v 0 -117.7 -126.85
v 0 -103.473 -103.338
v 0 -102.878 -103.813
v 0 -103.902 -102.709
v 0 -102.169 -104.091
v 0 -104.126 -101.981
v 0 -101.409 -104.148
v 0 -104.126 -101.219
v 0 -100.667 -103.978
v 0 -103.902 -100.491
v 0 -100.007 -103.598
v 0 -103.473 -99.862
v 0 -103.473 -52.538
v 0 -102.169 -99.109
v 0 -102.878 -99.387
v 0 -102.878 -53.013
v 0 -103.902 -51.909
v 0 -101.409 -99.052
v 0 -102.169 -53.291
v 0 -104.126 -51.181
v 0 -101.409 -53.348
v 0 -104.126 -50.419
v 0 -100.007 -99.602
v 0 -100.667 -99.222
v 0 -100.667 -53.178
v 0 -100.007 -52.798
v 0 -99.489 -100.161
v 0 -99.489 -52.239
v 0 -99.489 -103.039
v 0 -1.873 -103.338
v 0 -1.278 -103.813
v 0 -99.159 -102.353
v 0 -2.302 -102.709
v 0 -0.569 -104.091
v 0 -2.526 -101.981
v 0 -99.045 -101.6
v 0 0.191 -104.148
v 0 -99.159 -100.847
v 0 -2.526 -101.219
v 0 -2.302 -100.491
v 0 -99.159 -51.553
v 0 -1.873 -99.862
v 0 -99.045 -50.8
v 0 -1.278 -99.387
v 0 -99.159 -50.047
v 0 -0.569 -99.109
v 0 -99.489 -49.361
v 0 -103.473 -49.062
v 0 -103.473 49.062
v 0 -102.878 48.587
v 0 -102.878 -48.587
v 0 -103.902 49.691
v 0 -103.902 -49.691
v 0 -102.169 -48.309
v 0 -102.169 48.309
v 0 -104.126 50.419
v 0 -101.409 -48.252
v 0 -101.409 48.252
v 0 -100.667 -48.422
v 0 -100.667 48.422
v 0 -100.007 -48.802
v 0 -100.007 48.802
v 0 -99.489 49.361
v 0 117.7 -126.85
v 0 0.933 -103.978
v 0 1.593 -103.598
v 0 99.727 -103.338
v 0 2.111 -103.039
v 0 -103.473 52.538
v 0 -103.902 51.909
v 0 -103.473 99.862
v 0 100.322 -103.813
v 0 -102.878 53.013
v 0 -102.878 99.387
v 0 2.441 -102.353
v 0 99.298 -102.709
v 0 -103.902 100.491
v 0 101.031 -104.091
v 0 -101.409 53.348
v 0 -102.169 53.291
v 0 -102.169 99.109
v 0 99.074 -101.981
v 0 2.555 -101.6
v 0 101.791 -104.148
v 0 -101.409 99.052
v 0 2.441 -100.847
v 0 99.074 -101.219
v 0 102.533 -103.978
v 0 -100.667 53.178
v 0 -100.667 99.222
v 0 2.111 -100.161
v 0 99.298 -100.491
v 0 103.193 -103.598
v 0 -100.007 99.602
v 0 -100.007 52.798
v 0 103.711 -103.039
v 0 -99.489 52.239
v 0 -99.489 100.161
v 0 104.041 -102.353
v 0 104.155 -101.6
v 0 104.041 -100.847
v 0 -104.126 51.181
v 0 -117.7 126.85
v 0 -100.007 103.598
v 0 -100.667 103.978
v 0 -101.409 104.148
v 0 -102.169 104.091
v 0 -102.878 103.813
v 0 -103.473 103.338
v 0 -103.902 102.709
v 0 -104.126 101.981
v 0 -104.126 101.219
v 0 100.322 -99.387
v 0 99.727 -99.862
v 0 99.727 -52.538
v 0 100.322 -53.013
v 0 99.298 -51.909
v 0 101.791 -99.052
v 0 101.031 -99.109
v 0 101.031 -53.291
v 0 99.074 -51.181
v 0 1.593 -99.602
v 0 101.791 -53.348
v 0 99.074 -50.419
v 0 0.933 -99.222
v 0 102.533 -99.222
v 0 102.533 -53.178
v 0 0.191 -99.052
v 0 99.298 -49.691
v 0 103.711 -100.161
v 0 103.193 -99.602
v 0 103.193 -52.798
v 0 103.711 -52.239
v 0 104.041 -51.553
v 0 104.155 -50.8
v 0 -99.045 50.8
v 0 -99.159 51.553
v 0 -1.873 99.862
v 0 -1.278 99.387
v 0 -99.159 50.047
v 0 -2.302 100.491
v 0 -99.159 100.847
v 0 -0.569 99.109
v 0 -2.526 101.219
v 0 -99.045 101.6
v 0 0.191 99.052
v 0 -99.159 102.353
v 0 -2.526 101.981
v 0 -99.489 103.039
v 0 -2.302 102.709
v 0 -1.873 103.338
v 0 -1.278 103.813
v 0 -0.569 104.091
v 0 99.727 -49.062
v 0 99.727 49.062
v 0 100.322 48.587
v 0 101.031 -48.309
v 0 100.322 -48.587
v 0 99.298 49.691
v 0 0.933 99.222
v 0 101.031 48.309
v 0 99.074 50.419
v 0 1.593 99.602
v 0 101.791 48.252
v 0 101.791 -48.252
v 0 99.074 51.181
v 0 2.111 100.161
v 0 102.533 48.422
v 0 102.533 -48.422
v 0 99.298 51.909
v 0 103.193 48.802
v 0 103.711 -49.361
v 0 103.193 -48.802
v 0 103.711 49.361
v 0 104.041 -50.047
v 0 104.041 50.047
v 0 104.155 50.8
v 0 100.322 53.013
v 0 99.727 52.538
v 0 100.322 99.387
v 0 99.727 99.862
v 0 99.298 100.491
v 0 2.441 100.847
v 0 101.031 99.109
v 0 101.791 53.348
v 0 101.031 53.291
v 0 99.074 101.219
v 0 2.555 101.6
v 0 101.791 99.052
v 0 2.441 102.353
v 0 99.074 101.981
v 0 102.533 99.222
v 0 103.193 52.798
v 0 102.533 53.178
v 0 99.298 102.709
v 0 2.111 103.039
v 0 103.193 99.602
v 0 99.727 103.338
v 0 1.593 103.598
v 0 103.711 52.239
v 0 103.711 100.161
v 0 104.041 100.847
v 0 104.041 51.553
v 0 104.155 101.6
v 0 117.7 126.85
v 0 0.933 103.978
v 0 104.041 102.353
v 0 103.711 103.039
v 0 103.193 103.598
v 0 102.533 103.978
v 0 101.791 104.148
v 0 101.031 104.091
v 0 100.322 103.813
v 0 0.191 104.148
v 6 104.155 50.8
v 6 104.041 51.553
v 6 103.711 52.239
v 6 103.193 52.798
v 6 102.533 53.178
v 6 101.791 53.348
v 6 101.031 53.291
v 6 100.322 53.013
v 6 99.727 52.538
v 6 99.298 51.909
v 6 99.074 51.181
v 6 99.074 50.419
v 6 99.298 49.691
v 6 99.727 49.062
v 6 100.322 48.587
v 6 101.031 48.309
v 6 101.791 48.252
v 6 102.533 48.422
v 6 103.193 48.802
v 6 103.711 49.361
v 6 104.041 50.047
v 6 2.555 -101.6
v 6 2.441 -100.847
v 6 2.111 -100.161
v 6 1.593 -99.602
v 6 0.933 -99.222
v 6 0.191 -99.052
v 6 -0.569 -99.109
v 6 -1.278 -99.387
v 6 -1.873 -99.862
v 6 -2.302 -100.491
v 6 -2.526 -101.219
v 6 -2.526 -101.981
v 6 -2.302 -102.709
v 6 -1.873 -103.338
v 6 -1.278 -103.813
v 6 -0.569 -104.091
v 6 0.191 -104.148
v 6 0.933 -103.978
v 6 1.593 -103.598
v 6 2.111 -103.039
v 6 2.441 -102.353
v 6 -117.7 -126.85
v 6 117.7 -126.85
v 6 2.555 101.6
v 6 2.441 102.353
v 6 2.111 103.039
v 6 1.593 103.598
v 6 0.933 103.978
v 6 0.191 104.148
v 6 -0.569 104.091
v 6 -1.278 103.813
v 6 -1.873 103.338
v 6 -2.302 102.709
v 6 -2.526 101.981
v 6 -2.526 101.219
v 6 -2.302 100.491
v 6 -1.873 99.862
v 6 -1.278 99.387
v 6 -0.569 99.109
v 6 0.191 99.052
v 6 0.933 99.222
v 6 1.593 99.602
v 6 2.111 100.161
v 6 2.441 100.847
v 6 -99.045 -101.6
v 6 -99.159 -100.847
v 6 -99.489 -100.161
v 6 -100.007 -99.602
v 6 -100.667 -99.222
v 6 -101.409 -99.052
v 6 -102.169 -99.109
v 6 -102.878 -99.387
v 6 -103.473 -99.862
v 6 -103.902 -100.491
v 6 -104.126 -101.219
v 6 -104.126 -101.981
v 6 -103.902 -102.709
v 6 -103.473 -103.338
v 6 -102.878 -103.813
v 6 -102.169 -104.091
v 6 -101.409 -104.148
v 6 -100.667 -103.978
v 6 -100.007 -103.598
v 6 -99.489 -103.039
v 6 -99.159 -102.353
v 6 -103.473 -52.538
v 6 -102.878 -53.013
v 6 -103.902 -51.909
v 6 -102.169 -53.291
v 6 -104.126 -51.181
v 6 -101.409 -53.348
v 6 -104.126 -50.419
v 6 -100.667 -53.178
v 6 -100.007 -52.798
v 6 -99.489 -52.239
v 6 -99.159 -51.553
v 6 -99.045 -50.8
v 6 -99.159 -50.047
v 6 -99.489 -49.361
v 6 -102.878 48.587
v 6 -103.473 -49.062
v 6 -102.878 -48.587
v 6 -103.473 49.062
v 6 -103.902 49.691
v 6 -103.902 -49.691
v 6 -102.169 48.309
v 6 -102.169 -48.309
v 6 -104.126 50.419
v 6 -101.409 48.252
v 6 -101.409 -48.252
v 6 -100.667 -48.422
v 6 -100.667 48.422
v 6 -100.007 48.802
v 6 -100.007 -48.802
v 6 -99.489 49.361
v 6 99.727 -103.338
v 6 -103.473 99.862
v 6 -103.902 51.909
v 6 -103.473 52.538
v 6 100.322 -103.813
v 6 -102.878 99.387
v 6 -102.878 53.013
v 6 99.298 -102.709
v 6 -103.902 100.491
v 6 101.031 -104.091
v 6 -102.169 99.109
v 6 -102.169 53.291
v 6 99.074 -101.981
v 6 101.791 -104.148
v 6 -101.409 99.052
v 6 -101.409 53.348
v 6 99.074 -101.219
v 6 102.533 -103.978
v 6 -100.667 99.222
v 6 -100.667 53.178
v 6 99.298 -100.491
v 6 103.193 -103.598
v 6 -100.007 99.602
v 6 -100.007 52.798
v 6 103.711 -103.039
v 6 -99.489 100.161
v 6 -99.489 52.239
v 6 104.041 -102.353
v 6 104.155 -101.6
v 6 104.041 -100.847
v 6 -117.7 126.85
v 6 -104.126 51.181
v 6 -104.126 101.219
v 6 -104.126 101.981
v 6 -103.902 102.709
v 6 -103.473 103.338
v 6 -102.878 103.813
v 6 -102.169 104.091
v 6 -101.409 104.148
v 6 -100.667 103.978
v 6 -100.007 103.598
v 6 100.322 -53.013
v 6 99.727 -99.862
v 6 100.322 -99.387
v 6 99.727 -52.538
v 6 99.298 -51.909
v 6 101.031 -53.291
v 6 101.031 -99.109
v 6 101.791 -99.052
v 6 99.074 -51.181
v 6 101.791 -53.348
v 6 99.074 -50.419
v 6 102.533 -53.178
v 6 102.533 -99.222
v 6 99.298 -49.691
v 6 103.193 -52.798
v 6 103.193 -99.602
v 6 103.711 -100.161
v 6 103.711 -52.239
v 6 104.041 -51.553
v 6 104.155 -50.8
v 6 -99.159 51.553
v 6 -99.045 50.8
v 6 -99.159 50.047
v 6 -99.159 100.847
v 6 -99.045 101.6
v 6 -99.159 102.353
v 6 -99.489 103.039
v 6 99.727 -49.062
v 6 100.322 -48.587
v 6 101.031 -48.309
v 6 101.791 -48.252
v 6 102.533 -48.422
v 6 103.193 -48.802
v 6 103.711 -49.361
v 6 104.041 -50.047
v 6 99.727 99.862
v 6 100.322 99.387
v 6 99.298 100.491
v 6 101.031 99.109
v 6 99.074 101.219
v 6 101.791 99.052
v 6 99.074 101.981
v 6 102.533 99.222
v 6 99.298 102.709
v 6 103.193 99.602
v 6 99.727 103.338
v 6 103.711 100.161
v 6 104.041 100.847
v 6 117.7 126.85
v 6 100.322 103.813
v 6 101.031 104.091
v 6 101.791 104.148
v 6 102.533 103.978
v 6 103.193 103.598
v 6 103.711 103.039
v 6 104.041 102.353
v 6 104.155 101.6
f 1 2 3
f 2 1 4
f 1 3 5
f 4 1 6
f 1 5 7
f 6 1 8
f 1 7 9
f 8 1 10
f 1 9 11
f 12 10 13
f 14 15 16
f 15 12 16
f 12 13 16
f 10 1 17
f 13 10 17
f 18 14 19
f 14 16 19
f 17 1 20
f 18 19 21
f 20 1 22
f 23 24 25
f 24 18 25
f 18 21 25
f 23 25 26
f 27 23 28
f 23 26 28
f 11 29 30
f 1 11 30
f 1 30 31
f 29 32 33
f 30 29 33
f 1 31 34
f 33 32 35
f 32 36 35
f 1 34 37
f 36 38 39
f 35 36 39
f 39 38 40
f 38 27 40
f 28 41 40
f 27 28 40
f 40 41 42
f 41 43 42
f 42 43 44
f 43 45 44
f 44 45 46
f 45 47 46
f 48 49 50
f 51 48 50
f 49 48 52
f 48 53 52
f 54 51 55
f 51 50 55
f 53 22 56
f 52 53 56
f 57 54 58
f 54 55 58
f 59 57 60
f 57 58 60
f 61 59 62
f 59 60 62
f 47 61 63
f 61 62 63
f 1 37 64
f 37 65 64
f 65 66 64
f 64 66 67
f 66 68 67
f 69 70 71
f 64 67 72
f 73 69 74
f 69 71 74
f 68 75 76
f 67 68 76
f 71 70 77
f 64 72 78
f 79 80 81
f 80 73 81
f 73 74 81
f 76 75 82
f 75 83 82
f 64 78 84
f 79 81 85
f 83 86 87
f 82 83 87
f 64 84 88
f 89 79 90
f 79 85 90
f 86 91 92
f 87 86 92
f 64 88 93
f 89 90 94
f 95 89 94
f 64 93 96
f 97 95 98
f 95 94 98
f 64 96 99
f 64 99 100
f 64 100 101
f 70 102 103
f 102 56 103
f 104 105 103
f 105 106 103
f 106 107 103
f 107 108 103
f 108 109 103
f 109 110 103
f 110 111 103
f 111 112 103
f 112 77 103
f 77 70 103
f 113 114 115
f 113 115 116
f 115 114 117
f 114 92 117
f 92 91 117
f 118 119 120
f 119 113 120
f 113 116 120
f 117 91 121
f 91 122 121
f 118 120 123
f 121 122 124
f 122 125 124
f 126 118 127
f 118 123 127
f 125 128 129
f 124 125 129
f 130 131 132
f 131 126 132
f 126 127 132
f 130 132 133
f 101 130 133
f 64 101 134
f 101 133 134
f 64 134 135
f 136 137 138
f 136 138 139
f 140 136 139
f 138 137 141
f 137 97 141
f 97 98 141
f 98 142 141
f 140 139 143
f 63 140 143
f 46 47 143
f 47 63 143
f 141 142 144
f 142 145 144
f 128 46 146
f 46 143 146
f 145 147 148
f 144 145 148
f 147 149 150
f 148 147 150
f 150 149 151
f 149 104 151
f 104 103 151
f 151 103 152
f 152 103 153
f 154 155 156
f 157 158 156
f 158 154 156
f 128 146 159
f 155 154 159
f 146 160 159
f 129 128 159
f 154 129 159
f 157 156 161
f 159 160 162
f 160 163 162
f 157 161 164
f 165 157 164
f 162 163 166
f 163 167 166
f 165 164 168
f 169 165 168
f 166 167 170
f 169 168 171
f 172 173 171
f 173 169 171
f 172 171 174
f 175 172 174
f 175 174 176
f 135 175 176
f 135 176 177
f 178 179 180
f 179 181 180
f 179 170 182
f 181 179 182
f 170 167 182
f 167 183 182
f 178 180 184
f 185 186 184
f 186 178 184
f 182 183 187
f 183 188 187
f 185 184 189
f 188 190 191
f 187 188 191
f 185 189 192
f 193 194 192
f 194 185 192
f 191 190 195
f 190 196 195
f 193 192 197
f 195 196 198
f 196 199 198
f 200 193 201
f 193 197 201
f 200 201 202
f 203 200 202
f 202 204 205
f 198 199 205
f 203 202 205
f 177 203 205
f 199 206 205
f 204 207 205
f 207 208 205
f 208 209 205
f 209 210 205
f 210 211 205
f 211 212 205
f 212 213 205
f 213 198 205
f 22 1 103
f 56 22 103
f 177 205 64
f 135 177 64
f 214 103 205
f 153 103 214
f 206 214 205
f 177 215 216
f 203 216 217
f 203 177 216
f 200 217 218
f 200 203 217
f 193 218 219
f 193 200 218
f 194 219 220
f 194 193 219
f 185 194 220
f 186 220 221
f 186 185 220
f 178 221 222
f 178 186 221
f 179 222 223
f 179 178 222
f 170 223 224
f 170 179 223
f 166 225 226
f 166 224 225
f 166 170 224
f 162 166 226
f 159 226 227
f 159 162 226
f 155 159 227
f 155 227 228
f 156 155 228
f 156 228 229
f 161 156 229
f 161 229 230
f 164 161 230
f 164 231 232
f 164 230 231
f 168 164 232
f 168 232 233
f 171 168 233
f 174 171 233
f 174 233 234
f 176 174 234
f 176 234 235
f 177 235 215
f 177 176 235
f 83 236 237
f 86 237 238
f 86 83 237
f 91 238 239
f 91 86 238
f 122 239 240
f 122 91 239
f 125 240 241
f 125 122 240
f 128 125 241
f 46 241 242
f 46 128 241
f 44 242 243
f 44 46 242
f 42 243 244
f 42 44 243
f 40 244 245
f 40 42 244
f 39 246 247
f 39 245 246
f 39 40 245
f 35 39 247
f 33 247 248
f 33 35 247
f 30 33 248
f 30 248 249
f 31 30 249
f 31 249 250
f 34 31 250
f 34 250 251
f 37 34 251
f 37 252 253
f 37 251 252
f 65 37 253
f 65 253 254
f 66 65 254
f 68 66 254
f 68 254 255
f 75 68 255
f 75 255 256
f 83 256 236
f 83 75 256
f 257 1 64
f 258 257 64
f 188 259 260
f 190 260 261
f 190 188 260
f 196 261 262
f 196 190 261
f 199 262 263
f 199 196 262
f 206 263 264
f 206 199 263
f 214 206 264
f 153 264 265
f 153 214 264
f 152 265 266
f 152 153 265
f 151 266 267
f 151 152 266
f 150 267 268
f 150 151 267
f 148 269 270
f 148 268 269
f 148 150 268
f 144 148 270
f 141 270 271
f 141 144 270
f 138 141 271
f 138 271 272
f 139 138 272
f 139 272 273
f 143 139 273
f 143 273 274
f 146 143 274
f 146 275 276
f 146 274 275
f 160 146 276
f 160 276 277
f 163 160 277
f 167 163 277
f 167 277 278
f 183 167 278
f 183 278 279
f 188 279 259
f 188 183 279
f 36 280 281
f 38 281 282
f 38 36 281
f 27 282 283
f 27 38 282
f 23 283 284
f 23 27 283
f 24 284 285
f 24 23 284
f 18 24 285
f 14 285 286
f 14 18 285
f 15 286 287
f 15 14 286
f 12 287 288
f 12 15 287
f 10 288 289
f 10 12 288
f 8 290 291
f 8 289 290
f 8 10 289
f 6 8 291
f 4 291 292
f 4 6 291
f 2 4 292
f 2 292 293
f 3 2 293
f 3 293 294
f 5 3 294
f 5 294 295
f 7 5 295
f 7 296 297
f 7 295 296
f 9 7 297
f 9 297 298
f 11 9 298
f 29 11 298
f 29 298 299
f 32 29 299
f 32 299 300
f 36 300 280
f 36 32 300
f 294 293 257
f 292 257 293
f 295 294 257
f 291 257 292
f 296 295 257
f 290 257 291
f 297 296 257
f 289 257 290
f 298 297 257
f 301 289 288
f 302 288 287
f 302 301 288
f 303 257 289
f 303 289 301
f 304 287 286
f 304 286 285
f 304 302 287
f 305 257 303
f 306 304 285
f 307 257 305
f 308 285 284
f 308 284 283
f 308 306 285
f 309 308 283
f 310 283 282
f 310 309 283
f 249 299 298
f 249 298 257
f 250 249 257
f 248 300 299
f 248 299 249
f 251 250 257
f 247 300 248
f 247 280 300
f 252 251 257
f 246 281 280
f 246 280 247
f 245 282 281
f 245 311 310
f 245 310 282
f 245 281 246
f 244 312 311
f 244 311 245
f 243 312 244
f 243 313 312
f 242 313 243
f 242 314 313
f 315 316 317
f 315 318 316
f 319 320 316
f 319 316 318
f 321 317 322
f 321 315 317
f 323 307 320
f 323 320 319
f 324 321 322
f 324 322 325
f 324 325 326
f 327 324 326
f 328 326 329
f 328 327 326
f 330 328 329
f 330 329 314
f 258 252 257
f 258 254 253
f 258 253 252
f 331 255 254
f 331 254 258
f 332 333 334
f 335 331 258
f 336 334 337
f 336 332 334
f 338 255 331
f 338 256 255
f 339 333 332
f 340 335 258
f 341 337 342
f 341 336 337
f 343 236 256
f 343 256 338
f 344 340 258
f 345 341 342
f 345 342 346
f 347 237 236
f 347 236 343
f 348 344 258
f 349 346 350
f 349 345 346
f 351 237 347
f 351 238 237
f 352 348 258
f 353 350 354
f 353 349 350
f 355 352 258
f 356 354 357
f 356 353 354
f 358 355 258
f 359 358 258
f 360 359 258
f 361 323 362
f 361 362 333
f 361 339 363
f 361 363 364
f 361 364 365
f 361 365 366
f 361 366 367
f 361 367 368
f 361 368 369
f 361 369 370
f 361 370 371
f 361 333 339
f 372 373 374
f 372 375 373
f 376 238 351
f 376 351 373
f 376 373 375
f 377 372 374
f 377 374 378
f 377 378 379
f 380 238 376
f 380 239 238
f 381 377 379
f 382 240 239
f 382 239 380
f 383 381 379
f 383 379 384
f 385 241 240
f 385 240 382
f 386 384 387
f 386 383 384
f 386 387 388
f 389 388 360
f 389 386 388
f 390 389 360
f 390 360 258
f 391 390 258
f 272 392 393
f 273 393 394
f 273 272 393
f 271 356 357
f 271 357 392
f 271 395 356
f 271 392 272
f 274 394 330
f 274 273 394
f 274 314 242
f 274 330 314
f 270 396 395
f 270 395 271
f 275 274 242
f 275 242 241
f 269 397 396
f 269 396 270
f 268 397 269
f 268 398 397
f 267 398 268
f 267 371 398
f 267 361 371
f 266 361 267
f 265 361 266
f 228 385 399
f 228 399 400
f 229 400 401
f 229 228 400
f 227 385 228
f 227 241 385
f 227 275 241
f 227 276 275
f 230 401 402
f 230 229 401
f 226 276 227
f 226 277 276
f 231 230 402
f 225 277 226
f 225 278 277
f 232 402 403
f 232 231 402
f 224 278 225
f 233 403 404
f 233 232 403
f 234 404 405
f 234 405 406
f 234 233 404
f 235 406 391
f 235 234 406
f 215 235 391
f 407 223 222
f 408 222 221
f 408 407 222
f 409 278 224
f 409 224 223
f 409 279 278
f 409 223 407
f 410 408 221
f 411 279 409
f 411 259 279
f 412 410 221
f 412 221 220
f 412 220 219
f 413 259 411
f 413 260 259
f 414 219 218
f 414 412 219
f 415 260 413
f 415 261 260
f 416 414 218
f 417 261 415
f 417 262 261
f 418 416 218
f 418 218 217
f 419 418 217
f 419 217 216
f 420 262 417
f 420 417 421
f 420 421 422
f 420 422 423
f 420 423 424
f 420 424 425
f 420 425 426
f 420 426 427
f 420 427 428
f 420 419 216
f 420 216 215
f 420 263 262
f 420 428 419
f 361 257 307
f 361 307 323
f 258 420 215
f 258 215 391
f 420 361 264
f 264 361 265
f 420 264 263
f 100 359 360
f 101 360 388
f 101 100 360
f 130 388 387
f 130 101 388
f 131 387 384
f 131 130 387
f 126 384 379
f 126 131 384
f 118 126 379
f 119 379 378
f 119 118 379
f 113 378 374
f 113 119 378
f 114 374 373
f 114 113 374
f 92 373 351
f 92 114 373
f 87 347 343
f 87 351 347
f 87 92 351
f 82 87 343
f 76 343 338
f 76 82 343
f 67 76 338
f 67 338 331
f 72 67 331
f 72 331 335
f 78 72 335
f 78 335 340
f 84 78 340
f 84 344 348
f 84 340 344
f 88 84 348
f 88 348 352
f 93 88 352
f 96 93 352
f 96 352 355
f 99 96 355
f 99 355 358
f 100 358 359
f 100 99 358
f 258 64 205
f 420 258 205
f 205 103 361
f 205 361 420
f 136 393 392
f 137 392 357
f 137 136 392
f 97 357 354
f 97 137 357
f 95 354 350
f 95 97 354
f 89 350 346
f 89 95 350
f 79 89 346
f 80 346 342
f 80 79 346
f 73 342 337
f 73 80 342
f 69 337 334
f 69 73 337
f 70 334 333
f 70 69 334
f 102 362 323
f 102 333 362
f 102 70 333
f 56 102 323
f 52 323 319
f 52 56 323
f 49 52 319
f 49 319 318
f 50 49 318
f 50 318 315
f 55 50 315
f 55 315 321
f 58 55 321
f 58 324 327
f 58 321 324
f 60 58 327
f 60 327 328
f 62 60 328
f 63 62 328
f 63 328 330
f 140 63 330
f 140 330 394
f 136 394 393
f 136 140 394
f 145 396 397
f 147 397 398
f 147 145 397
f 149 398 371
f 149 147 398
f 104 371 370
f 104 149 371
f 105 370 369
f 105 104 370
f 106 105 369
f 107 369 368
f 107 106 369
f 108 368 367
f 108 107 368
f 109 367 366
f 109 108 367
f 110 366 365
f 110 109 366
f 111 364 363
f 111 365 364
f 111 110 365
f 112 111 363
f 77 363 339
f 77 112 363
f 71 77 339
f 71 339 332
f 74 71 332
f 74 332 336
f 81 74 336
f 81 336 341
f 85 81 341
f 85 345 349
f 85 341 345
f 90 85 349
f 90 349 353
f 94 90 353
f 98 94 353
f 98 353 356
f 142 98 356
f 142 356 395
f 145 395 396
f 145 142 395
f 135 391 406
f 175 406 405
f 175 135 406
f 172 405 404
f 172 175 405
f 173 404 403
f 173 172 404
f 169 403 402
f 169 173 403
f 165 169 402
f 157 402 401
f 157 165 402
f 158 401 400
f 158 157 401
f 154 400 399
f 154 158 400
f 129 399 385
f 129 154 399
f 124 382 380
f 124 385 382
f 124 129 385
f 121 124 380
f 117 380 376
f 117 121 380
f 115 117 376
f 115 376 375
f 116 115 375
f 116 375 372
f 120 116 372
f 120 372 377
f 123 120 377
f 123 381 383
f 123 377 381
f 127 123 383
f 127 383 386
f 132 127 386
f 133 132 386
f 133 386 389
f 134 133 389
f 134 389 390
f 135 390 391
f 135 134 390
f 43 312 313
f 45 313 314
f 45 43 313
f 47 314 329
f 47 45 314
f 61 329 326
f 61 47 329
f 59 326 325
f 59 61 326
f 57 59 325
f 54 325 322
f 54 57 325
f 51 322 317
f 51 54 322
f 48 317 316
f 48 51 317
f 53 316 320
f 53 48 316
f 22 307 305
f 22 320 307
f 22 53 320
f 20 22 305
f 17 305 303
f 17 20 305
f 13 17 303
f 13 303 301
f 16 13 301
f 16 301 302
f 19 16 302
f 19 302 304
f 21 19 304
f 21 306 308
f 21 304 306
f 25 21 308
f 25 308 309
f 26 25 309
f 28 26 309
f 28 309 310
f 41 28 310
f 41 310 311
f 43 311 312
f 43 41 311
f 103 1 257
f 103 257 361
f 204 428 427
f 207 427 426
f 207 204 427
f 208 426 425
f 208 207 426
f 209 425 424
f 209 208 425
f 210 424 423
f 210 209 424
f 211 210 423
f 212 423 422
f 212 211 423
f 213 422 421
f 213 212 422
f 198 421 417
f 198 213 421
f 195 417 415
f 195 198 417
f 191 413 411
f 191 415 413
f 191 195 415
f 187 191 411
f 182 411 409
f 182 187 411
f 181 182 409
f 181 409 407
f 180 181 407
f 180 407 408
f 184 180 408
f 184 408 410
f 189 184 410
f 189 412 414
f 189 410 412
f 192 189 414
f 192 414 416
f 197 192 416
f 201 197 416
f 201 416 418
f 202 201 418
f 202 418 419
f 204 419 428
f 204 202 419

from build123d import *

# Parameters (mm, degrees)
SKETCH1_W           = 235.4
SKETCH1_H           = 253.7
BOSS_EXTRUDE1_DEPTH = 6
SKETCH1_3_R         = 2.555
CUT_EXTRUDE1_DEPTH  = 10


with BuildPart() as part:
    # Sketch1 → Boss-Extrude1 (new body)
    with BuildSketch(Plane.YZ):
        Rectangle(SKETCH1_W, SKETCH1_H)
    extrude(amount=BOSS_EXTRUDE1_DEPTH)

    # Sketch1<3> → Cut-Extrude1 (cut)
    with BuildSketch(Plane.YZ):
        with Locations((-101.6, 101.6)):
            Circle(SKETCH1_3_R)
        with Locations((101.6, 101.6)):
            Circle(SKETCH1_3_R)
        with Locations((-101.6, -101.6)):
            Circle(SKETCH1_3_R)
        with Locations((101.6, -101.6)):
            Circle(SKETCH1_3_R)
        with Locations((0, -101.6)):
            Circle(SKETCH1_3_R)
        with Locations((0, 101.6)):
            Circle(SKETCH1_3_R)
        with Locations((-101.6, -50.8)):
            Circle(SKETCH1_3_R)
        with Locations((101.6, -50.8)):
            Circle(SKETCH1_3_R)
        with Locations((101.6, 50.8)):
            Circle(SKETCH1_3_R)
        with Locations((-101.6, 50.8)):
            Circle(SKETCH1_3_R)
    extrude(amount=CUT_EXTRUDE1_DEPTH, mode=Mode.SUBTRACT)


solid = part.part
